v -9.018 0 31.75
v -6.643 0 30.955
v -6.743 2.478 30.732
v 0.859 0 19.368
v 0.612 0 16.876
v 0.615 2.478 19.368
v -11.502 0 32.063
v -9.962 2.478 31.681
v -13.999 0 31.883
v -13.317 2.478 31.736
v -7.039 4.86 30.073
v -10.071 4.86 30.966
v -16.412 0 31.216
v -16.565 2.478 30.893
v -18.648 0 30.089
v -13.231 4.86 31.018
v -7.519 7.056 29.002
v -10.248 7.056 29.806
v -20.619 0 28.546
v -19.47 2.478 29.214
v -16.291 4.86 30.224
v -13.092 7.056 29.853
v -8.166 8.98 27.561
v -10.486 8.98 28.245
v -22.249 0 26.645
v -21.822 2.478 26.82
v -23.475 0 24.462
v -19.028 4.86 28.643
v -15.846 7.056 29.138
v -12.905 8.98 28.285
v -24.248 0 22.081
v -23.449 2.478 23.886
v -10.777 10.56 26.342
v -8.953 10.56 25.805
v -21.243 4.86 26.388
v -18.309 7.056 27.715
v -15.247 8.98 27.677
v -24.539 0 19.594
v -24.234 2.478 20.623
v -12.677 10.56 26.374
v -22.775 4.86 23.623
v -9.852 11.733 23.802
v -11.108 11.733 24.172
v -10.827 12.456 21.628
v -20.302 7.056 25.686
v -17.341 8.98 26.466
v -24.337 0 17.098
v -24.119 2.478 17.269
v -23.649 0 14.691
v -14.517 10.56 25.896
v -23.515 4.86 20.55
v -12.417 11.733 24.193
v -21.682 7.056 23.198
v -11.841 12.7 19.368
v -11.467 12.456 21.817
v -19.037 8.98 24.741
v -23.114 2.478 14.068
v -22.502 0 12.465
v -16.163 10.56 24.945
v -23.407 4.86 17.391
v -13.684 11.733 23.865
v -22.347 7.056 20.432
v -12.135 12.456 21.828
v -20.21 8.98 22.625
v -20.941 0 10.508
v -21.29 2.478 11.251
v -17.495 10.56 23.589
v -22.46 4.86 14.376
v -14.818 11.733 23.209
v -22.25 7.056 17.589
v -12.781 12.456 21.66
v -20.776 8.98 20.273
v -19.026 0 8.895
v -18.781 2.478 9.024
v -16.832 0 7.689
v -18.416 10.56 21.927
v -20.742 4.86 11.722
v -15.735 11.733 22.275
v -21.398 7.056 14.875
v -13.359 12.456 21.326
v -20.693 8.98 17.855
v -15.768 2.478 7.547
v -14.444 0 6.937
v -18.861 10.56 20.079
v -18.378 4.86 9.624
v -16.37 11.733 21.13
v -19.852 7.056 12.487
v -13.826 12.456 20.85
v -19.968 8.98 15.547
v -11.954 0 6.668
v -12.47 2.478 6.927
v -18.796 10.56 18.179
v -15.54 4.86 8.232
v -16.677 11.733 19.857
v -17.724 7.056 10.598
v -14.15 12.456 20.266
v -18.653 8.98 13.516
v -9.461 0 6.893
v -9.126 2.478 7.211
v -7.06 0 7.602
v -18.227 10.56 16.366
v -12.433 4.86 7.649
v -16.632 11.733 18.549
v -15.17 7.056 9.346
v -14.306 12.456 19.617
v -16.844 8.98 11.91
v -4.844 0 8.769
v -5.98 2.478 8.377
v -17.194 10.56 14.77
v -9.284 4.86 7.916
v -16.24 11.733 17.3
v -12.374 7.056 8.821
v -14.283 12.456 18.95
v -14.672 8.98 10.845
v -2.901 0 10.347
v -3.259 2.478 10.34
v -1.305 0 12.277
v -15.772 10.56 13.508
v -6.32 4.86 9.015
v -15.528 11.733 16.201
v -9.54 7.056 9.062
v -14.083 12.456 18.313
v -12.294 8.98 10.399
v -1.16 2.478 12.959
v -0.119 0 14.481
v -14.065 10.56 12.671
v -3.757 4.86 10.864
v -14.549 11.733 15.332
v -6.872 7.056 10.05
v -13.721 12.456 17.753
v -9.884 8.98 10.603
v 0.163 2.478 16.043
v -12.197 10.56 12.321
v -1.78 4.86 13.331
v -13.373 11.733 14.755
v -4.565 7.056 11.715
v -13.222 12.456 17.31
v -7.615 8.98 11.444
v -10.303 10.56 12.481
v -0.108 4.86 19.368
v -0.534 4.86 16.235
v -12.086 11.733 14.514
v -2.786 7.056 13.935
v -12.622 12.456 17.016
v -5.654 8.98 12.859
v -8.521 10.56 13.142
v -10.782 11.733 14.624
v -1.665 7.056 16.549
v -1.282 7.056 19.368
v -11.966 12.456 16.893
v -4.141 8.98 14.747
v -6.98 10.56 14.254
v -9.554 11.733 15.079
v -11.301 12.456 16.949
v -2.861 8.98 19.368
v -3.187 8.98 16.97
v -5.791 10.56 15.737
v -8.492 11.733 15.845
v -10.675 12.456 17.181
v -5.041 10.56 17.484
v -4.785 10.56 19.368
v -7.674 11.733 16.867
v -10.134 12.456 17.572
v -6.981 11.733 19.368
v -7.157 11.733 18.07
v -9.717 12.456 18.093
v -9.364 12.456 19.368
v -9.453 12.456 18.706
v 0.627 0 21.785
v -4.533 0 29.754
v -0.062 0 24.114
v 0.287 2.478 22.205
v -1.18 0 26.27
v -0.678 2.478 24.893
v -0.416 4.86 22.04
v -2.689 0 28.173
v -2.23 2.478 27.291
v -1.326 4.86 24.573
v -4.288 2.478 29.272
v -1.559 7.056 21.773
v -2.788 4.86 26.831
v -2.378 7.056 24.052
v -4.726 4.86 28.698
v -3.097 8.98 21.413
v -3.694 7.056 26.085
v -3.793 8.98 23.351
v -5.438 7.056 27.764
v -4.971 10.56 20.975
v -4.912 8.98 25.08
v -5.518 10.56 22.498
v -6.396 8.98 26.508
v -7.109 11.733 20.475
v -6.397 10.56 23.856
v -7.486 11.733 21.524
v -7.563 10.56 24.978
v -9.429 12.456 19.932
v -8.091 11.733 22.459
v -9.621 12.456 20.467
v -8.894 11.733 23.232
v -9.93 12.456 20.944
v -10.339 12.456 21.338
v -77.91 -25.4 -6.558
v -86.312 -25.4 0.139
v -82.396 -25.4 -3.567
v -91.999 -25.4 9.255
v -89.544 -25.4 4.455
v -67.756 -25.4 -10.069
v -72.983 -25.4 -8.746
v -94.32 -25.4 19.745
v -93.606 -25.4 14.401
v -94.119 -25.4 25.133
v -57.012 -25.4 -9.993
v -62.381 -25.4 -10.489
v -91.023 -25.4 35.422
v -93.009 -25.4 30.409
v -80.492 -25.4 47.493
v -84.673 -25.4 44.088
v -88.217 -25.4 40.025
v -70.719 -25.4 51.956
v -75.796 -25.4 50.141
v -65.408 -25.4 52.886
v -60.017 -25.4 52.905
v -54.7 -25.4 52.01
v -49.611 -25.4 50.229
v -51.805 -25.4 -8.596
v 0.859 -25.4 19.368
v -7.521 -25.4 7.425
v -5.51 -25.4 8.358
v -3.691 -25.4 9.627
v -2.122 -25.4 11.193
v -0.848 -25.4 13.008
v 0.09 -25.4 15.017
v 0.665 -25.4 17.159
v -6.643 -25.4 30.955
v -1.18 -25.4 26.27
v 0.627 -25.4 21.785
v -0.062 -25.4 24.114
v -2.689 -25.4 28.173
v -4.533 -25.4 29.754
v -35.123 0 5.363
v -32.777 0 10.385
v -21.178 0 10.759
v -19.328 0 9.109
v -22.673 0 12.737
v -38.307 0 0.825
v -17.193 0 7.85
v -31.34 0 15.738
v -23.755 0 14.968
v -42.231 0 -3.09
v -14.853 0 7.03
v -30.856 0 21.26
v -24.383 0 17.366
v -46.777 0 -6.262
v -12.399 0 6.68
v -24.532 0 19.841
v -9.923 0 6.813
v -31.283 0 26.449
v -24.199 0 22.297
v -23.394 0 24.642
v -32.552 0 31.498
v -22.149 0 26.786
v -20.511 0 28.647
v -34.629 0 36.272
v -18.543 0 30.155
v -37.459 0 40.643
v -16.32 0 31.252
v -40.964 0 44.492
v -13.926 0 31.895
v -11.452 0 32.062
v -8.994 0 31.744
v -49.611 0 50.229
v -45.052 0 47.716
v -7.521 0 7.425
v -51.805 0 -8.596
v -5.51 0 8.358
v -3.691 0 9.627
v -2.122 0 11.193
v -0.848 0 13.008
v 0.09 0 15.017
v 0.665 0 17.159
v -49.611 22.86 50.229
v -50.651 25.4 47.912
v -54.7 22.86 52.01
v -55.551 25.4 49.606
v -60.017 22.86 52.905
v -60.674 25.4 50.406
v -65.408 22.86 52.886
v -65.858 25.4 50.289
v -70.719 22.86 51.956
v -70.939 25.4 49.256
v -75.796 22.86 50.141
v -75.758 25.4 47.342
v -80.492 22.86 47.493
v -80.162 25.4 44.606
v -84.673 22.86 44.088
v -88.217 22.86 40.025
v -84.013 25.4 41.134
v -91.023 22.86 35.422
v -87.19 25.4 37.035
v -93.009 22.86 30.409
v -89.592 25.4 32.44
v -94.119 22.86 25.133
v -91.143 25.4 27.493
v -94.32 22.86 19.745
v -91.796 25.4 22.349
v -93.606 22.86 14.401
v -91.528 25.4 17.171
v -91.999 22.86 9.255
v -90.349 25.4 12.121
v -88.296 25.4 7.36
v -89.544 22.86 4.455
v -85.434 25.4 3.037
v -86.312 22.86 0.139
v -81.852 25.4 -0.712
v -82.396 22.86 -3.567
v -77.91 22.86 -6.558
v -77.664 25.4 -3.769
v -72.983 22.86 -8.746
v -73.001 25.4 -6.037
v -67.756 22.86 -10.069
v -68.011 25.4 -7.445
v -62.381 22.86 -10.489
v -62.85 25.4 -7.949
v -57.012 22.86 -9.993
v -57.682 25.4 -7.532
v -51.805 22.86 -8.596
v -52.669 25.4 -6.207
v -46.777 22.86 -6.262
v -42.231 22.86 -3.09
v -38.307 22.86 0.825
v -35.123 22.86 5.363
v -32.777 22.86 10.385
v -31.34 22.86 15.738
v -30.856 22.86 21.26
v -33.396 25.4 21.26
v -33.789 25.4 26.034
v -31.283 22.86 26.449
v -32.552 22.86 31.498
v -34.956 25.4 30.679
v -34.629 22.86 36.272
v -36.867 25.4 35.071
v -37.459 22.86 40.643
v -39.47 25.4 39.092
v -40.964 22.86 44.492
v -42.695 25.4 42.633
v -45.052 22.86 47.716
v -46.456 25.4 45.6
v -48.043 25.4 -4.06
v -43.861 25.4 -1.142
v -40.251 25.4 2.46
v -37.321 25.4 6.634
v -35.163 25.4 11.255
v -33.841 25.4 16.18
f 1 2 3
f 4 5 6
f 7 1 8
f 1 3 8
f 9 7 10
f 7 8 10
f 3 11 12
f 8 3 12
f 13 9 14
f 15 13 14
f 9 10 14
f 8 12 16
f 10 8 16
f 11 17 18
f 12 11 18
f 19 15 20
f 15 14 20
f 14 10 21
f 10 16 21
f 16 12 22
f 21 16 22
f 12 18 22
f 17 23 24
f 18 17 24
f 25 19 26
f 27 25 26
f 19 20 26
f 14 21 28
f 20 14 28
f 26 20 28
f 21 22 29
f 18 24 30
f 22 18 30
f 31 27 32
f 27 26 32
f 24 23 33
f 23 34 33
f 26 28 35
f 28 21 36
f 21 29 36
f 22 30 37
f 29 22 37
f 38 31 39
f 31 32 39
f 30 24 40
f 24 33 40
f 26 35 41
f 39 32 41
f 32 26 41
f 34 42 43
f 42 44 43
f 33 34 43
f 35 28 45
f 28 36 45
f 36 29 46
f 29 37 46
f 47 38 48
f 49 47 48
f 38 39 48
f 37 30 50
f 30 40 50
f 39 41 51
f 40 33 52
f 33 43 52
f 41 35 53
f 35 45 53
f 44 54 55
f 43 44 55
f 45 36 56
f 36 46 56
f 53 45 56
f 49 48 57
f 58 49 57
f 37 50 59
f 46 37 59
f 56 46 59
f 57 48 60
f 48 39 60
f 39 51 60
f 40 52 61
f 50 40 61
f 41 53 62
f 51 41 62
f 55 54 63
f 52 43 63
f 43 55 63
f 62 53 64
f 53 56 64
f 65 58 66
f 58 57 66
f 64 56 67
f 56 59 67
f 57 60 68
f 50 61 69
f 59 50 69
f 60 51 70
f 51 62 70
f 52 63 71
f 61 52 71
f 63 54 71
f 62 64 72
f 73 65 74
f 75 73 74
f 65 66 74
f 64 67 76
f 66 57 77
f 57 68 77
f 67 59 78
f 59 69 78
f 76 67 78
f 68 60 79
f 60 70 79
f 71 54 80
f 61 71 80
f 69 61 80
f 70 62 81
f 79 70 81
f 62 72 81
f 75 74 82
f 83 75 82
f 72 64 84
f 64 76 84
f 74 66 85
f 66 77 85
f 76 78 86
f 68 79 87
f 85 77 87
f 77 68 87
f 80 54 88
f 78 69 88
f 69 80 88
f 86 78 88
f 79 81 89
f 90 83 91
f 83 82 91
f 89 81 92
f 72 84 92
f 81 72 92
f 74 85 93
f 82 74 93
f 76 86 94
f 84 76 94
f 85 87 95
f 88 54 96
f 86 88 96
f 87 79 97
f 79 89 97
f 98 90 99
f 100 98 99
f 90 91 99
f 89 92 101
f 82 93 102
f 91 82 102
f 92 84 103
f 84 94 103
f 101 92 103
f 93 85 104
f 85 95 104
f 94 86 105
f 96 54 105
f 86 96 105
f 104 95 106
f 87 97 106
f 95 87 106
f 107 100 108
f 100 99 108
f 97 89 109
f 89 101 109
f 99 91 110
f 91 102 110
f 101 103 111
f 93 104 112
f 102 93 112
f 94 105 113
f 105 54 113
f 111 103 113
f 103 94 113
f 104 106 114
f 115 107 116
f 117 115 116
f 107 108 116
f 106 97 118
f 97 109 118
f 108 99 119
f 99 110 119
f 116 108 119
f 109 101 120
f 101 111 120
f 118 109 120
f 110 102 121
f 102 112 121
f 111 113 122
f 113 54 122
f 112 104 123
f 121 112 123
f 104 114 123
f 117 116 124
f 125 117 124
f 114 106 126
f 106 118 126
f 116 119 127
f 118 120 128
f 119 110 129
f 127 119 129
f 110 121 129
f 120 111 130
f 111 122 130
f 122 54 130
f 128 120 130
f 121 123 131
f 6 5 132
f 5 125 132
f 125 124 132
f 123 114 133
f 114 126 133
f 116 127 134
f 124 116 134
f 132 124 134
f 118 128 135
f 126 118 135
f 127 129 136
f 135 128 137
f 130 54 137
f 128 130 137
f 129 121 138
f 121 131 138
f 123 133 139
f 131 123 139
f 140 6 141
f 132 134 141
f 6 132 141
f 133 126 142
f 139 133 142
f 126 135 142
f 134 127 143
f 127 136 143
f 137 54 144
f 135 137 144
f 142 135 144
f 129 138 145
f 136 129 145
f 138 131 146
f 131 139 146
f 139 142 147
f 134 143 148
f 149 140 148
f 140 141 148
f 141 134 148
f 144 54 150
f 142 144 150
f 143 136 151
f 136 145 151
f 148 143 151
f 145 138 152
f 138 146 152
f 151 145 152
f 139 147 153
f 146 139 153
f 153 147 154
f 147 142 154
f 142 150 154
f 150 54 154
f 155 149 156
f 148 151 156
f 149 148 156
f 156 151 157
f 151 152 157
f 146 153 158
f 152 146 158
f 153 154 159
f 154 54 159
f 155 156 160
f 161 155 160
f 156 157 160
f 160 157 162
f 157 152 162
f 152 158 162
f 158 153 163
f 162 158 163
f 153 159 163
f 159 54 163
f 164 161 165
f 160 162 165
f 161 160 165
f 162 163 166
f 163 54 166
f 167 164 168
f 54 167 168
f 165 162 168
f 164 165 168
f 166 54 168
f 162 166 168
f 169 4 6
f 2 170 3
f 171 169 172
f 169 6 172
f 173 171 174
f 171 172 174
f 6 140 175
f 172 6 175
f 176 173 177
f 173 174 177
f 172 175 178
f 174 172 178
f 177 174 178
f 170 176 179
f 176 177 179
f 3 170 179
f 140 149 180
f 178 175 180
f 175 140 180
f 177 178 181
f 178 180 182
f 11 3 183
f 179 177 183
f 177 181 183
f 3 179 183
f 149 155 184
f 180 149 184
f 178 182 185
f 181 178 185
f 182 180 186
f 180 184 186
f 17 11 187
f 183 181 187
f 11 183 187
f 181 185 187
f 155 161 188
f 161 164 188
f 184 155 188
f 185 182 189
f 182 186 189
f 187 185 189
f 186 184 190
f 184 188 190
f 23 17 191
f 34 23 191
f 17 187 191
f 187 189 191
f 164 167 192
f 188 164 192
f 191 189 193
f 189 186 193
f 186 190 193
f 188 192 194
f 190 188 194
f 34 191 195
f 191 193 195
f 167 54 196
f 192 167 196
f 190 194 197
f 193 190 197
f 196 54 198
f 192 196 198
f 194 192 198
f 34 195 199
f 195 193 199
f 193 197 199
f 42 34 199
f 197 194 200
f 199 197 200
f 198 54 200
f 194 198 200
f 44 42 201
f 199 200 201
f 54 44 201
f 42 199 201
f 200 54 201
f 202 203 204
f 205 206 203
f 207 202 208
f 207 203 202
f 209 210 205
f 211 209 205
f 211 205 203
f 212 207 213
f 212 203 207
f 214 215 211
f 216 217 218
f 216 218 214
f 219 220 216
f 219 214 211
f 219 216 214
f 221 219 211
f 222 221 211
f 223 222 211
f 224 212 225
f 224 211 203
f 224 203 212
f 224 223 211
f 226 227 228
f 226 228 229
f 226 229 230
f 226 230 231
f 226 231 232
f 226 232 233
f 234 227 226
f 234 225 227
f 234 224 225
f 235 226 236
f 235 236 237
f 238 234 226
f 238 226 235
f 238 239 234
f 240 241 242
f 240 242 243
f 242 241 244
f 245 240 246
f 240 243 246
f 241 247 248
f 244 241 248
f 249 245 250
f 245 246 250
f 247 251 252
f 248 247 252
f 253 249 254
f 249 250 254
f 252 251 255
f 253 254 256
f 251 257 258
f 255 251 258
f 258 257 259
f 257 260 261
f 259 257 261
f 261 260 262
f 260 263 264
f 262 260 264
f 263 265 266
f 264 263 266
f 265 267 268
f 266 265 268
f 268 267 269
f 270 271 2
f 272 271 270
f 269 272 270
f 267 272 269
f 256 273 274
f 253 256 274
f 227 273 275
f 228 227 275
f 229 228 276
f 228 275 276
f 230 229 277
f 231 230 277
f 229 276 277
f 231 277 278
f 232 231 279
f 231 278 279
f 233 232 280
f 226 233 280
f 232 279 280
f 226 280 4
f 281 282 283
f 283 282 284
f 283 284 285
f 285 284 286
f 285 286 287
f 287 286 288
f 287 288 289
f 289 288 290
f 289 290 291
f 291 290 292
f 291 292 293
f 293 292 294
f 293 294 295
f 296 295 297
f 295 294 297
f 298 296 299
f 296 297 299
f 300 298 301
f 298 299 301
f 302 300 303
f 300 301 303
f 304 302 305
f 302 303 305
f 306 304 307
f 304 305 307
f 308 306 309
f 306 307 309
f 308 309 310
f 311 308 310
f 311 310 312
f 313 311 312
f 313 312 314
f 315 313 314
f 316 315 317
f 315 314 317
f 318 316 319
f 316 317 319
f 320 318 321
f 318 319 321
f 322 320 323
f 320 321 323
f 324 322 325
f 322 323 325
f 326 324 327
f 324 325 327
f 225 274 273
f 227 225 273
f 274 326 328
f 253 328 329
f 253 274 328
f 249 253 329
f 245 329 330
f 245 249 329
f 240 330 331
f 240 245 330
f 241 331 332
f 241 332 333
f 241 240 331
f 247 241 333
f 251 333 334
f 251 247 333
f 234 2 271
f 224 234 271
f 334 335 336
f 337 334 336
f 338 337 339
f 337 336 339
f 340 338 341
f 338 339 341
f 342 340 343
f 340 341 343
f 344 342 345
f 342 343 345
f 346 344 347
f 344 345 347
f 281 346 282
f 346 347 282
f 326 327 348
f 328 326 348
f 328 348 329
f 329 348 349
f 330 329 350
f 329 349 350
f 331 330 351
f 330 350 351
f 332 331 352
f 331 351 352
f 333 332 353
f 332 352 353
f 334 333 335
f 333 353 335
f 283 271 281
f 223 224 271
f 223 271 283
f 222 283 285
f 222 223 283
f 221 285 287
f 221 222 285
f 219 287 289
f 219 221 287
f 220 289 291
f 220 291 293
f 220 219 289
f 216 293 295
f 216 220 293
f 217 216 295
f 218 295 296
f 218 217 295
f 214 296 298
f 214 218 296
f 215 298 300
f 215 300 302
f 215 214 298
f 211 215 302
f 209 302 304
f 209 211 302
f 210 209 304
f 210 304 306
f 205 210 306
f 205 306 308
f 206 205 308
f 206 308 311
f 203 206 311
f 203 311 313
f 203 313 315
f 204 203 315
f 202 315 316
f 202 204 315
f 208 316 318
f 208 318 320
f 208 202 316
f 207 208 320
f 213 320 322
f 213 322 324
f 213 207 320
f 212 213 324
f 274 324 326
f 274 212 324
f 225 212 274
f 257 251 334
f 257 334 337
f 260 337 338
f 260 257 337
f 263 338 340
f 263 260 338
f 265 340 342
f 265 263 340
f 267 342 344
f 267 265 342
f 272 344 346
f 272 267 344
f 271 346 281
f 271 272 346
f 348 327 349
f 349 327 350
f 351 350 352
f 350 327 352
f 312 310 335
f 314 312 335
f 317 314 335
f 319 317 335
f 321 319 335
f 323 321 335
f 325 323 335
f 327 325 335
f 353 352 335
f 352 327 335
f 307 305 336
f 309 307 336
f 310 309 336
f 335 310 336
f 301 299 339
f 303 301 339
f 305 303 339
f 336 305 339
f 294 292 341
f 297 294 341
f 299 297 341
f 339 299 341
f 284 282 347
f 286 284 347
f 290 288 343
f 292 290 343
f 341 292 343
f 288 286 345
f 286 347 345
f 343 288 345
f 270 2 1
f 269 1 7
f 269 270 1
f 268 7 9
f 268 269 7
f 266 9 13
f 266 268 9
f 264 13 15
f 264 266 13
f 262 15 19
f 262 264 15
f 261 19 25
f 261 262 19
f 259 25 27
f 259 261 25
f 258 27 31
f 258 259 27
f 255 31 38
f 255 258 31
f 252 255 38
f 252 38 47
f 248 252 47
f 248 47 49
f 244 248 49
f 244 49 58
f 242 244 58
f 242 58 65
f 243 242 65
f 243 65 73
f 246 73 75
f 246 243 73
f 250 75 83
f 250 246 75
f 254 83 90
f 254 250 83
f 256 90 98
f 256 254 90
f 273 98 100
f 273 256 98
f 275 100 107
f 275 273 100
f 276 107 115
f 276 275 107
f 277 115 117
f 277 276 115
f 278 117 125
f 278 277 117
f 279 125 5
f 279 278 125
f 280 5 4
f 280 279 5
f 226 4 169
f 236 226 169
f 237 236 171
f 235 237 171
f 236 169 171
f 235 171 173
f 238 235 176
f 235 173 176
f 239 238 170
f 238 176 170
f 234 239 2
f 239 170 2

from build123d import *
from build123d import SkipClean  # not in build123d's __all__

# Parameters (mm, degrees)
F1_DEPTH = 25.4
F2_DEPTH = 25.4
F3_DEPTH = 12.7
F4_R     = 12.69999
F5_SIZE  = 2.54


# Not quite as in the source:
# - a fillet or chamfer is up to 0.001 mm smaller than in the source, because OpenCascade refuses the exact size
# - after a boolean that leaves OpenCascade's solid faulty, fix() repairs it


with BuildPart() as f1:
    # F0 (on Front) → F1 (new body)
    with BuildSketch(Plane.XZ):
        with BuildLine():
            ThreePointArc((-51.8046888554, -8.5958305632), (-36.6155359926, 3.0241505339), (-30.8559403173, 21.2604161342))
            ThreePointArc((-30.8559403173, 21.2604161342), (-35.9540680262, 38.515566188), (-49.6112287191, 50.2293645183))
            ThreePointArc((-49.6112287191, 50.2293645183), (-94.3338910639, 22.443480552), (-51.8046888554, -8.5958305632))
        make_face()
        with BuildLine():
            ThreePointArc((-49.6112287191, 50.2293645183), (-35.9540680262, 38.515566188), (-30.8559403173, 21.2604161342))
            ThreePointArc((-30.8559403173, 21.2604161342), (-36.6155359926, 3.0241505339), (-51.8046888554, -8.5958305632))
            Line((-51.8046888554, -8.5958305632), (-7.5207185378, 7.4250143868))
            ThreePointArc((-7.5207185378, 7.4250143868), (-24.5323994212, 19.8407388329), (-6.6433344833, 30.9550924194))
            Line((-6.6433344833, 30.9550924194), (-49.6112287191, 50.2293645183))
        make_face()
        with BuildLine():
            ThreePointArc((0.8587808774, 19.3675130658), (-1.1804702061, 26.2695730873), (-6.6433344833, 30.9550924194))
            ThreePointArc((-6.6433344833, 30.9550924194), (-24.5323994212, 19.8407388329), (-7.5207185378, 7.4250143868))
            ThreePointArc((-7.5207185378, 7.4250143868), (-1.4450573927, 12.0730068257), (0.8587808774, 19.3675130658))
        make_face()
    extrude(amount=F1_DEPTH)

    # F0 (on Front) → F2 (join)
    with BuildSketch(Plane.XZ):
        with BuildLine():
            ThreePointArc((-51.8046888554, -8.5958305632), (-36.6155359926, 3.0241505339), (-30.8559403173, 21.2604161342))
            ThreePointArc((-30.8559403173, 21.2604161342), (-35.9540680262, 38.515566188), (-49.6112287191, 50.2293645183))
            ThreePointArc((-49.6112287191, 50.2293645183), (-94.3338910639, 22.443480552), (-51.8046888554, -8.5958305632))
        make_face()
    with SkipClean():  # cleaning this boolean's faces spoils the solid; the shape is the same uncleaned
        extrude(amount=-F2_DEPTH)

    # F0 (on Front) → F3 (join)
    with BuildSketch(Plane.XZ):
        with BuildLine():
            ThreePointArc((0.8587808774, 19.3675130658), (-1.1804702061, 26.2695730873), (-6.6433344833, 30.9550924194))
            ThreePointArc((-6.6433344833, 30.9550924194), (-24.5323994212, 19.8407388329), (-7.5207185378, 7.4250143868))
            ThreePointArc((-7.5207185378, 7.4250143868), (-1.4450573927, 12.0730068257), (0.8587808774, 19.3675130658))
        make_face()
    extrude(amount=-F3_DEPTH)

    add(f1.part.fix(), mode=Mode.REPLACE)

    # F4 (radius 12.7 in the source; OpenCascade refuses exactly that, so slightly less here)
    f4_edges = [f1.edges().sort_by_distance(p)[0] for p in [
        (-16.16172, 12.7, 31.310012),
    ]]
    fillet(f4_edges, radius=F4_R)

    # F5
    f5_edges = [f1.edges().sort_by_distance(p)[0] for p in [
        (-73.407192, 25.4, 51.116663),
    ]]
    chamfer(f5_edges, length=F5_SIZE)


solid = f1.part
